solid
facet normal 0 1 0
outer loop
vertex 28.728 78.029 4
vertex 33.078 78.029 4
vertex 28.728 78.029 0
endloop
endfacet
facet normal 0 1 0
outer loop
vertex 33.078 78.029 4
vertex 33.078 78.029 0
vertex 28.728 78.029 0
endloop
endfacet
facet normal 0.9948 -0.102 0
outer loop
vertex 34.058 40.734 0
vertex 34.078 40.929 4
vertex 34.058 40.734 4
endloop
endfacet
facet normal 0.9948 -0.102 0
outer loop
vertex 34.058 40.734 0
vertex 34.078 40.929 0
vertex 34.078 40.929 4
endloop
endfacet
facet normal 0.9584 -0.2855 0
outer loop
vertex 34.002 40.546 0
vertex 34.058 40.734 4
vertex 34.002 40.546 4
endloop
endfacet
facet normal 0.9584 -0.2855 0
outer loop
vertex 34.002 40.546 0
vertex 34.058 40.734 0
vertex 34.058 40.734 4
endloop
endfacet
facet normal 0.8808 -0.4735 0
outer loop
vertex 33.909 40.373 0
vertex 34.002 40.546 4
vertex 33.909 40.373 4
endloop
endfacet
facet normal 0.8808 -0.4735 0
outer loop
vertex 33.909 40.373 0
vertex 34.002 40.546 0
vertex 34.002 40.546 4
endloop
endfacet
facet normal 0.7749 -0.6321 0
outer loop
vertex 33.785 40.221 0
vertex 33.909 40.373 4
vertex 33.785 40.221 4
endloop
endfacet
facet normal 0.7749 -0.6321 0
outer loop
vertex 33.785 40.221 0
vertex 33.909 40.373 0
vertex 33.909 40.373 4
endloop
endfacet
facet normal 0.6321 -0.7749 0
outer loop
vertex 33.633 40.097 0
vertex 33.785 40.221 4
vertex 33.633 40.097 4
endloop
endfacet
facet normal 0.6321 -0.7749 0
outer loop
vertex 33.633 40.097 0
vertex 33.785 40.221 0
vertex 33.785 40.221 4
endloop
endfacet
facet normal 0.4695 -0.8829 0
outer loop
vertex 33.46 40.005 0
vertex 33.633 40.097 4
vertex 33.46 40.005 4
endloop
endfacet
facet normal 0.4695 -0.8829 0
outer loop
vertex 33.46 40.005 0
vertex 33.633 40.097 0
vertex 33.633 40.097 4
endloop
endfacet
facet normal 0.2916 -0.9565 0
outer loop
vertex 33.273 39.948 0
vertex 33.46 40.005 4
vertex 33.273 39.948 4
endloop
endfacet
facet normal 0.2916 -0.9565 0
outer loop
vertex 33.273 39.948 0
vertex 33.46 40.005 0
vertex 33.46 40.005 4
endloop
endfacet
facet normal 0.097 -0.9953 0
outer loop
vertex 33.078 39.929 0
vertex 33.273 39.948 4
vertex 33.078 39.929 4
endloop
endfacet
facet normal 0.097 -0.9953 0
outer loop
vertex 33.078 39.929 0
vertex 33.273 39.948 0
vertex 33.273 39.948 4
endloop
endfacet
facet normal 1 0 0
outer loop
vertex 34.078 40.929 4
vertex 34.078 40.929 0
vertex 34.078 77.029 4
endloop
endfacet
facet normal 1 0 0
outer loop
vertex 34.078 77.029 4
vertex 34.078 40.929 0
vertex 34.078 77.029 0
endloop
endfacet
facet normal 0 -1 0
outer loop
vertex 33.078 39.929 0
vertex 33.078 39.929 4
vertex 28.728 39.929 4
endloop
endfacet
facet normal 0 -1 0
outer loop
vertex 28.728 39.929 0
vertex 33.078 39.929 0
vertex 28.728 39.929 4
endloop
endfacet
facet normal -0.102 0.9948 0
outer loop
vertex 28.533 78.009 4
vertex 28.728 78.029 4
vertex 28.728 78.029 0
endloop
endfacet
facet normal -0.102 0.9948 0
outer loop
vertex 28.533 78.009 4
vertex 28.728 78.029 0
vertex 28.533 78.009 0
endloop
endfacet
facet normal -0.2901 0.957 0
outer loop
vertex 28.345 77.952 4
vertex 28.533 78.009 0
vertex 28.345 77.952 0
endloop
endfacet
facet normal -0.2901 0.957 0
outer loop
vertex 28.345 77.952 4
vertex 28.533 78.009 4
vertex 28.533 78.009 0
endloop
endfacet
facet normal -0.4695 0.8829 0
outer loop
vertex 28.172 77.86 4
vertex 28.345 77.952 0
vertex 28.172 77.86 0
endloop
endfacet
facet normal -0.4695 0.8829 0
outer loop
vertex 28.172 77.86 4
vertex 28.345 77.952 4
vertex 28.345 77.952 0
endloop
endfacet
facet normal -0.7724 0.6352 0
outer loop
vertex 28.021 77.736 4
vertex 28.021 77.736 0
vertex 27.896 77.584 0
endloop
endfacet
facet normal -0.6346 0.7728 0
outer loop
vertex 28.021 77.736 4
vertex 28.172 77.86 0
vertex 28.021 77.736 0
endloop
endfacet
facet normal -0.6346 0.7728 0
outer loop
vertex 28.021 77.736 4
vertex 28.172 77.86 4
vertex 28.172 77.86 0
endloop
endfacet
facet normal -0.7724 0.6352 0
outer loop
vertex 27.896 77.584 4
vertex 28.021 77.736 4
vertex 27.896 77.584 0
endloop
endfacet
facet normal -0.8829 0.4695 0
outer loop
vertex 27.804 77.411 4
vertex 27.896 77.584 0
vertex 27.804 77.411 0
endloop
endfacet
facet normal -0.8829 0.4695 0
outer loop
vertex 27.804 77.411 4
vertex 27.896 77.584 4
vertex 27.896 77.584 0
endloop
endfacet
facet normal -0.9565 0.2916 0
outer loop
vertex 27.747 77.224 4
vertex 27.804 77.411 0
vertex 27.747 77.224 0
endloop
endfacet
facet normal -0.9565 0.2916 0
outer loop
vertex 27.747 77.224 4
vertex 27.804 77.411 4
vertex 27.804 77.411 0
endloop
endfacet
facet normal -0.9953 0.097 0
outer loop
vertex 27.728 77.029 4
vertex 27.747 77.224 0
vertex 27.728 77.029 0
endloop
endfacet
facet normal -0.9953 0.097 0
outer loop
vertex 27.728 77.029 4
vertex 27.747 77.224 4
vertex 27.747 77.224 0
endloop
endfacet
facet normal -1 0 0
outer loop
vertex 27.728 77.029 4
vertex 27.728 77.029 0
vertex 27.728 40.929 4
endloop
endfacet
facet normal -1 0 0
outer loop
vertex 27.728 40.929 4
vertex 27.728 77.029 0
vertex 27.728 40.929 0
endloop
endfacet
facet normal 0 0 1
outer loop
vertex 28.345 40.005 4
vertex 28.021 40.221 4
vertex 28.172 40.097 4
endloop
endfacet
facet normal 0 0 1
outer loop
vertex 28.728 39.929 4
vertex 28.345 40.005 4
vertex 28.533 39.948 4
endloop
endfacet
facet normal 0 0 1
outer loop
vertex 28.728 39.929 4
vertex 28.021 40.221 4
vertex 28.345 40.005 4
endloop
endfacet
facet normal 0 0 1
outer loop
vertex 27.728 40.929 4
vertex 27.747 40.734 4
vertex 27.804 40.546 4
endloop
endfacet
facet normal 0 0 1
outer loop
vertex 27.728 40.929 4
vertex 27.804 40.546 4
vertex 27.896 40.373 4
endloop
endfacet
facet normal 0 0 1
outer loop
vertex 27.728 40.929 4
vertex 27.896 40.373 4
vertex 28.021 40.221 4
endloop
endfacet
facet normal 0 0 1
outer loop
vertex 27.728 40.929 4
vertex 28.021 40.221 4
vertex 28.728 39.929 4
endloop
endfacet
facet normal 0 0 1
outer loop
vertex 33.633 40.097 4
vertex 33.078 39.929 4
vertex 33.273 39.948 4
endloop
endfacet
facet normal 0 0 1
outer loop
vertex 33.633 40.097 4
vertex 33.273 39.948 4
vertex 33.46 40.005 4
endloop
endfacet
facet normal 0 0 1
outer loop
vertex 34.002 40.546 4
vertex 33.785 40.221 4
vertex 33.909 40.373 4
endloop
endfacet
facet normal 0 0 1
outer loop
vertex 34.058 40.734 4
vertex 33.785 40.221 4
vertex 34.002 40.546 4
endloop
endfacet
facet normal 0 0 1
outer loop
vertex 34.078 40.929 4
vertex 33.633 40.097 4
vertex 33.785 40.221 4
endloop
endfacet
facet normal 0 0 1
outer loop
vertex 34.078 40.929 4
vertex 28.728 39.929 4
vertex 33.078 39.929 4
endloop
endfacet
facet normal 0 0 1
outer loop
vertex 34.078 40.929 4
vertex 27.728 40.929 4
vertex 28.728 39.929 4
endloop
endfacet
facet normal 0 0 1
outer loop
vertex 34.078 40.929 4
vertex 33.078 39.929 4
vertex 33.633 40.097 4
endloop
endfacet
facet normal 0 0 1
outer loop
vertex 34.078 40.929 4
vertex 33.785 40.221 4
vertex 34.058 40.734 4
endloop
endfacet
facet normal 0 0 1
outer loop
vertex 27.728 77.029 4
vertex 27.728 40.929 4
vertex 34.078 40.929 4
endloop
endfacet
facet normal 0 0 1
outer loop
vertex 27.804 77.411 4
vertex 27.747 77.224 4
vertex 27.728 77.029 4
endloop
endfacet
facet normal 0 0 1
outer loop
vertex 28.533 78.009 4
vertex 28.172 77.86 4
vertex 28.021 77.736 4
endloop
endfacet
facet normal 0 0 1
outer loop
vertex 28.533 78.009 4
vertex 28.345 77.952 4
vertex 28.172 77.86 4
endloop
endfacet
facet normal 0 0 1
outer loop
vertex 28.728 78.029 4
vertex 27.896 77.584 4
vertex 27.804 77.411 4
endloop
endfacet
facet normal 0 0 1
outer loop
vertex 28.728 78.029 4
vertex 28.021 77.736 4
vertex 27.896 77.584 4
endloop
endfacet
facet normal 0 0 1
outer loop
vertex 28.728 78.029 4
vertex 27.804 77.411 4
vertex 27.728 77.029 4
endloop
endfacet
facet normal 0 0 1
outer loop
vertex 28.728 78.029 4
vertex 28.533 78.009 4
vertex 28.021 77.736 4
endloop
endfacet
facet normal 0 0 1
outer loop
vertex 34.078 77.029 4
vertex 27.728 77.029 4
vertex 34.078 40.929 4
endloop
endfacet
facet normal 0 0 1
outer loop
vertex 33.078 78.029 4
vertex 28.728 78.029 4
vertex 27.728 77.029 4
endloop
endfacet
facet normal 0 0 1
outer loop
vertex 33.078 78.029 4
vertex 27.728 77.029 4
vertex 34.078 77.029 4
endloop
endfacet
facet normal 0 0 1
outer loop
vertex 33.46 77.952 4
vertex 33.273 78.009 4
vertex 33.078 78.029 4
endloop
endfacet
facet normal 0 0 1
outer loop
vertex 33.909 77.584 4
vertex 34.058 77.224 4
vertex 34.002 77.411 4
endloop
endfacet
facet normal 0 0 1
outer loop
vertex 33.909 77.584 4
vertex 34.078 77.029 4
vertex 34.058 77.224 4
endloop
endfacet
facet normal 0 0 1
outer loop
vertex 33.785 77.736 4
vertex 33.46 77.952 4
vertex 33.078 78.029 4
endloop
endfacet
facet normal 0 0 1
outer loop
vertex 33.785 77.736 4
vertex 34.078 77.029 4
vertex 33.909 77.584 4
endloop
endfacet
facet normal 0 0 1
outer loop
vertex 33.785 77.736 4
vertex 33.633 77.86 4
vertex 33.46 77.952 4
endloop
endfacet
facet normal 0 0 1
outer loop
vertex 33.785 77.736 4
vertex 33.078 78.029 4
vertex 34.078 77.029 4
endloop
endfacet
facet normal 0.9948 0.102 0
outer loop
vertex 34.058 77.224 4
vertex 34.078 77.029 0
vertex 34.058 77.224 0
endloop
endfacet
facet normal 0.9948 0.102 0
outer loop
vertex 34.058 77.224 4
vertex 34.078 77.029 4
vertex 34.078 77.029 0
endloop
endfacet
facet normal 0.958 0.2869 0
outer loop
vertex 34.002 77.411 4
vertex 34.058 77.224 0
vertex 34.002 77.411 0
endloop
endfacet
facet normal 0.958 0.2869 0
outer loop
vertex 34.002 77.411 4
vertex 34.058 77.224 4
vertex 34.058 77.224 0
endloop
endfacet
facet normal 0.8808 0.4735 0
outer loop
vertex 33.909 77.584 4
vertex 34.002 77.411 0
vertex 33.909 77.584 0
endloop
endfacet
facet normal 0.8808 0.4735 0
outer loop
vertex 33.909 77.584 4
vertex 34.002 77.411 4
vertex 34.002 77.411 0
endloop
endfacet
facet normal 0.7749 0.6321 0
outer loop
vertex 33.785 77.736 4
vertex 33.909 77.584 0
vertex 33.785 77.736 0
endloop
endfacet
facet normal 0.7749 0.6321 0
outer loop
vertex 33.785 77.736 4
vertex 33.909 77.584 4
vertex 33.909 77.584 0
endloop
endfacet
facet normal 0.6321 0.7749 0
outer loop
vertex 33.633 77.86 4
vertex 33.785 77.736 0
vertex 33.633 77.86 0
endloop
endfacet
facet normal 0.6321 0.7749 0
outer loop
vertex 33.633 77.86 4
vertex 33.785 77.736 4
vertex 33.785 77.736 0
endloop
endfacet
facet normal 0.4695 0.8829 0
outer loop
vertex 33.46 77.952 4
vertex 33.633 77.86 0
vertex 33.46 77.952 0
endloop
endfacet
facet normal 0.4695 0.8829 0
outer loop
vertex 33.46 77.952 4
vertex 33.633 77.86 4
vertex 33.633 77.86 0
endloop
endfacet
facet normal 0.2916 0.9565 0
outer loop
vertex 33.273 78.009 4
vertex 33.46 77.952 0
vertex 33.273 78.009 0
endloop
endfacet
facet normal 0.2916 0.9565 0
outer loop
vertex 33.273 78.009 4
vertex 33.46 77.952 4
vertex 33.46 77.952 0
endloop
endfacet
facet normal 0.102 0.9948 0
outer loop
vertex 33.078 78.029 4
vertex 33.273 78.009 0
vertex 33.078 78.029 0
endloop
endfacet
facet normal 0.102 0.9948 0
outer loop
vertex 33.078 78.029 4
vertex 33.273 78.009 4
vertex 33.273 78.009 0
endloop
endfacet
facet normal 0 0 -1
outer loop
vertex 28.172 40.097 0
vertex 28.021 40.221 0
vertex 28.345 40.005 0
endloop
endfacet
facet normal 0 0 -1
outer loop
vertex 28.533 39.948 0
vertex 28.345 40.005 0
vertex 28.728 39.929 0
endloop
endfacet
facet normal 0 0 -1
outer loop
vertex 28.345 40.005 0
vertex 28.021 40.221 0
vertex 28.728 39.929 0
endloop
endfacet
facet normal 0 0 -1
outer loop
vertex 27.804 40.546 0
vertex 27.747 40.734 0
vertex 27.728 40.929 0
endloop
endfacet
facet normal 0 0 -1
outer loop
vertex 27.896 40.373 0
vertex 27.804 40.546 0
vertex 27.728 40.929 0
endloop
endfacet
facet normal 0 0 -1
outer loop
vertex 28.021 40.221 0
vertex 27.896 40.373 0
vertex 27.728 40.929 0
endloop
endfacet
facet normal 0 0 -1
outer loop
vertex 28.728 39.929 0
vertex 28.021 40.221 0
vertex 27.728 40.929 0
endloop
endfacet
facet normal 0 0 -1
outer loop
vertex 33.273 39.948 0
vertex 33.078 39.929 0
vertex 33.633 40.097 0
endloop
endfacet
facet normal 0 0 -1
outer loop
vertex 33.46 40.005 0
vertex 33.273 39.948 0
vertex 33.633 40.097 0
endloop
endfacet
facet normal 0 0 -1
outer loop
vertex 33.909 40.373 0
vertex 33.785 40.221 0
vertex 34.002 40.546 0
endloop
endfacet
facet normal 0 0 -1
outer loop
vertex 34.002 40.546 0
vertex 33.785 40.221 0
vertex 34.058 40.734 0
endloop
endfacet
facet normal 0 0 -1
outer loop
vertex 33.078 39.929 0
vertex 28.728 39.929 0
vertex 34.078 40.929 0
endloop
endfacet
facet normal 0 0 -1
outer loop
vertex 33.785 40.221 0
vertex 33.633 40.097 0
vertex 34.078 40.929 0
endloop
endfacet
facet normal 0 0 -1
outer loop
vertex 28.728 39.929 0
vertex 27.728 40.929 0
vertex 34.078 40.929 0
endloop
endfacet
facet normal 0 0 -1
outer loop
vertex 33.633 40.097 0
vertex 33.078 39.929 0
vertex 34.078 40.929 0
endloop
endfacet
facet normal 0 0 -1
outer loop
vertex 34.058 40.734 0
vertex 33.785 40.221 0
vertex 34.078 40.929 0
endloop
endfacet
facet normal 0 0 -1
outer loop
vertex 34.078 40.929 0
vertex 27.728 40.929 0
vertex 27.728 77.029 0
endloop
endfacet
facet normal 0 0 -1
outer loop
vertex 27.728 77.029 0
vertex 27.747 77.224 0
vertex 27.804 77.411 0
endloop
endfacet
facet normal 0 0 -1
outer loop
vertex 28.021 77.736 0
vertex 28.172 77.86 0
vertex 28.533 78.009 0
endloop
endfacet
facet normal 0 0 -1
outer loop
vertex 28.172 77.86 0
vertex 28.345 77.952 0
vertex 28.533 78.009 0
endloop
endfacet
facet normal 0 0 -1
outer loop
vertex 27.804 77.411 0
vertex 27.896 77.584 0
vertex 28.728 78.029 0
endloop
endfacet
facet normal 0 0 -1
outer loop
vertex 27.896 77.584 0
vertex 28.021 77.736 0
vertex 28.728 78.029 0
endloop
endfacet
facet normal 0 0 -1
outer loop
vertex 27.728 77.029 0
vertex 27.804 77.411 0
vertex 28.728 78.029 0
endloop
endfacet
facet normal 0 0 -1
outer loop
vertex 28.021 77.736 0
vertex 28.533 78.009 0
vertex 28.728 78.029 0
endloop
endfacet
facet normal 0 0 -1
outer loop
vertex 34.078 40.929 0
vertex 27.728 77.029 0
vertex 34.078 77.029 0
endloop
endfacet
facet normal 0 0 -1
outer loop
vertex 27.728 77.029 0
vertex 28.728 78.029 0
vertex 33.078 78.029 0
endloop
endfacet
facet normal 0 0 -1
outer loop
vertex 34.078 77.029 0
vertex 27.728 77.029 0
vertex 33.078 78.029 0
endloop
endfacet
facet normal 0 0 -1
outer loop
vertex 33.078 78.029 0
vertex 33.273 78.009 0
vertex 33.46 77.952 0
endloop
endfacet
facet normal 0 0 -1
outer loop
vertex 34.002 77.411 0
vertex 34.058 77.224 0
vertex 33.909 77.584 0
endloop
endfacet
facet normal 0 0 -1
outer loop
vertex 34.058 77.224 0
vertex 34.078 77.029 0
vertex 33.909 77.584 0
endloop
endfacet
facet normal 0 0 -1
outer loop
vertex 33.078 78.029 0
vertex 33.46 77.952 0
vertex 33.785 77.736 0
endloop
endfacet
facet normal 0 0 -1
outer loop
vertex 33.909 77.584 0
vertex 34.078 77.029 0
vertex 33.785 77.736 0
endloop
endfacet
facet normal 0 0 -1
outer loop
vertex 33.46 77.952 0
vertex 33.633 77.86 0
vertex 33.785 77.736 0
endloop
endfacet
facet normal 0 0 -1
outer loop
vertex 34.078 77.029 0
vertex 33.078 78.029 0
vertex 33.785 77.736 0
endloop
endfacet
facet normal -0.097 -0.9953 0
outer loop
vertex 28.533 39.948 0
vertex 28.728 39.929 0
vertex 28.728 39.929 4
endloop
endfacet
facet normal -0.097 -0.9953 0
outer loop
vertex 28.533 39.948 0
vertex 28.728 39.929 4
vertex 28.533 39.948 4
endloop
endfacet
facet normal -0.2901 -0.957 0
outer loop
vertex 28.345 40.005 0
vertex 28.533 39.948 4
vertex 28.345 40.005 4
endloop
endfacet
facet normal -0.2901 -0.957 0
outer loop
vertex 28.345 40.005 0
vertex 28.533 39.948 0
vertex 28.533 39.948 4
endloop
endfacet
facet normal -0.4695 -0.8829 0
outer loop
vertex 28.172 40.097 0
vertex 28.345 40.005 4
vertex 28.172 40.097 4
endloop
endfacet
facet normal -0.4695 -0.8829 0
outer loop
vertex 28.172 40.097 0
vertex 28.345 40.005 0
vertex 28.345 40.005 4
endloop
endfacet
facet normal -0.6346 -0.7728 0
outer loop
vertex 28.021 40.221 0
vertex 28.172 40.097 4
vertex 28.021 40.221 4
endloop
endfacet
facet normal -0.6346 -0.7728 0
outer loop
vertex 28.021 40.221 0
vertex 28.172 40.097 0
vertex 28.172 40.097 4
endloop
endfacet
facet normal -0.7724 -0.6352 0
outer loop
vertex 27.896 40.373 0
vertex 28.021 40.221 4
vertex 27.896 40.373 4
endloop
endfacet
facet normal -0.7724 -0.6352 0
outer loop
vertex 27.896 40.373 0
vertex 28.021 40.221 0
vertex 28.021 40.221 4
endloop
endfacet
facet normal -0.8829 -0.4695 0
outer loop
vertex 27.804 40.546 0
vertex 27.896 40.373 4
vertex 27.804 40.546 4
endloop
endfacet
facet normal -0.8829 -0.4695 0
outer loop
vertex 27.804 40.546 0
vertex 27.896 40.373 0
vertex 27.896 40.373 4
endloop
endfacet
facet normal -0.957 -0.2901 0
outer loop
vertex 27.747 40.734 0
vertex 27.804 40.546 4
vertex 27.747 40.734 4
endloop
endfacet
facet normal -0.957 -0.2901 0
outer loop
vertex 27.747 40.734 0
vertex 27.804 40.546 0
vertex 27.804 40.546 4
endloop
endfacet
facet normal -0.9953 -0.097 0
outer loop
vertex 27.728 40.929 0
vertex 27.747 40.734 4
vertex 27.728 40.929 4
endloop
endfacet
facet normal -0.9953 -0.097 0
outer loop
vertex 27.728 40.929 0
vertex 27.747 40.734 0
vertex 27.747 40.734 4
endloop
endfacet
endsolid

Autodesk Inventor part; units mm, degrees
ref_plane "YZ Plane" through (0, 0, 0) normal (1, 0, 0) x (0, 1, 0)
ref_plane "XZ Plane" through (0, 0, 0) normal (0, 1, 0) x (-1, 0, 0)
ref_plane "XY Plane" through (0, 0, 0) normal (0, 0, 1) x (1, 0, 0)
sketch "Sketch1" plane through (0, 0, 0) normal (0, 0, 1) x (1, 0, 0)
  circle A0 centre (27.1, 34.2286) radius 4 projected
  circle A1 centre (27.1, 34.2286) radius 5 projected
  circle A2 centre (27.0777, 74.6286) radius 4 projected
  circle A3 centre (27.0777, 74.6286) radius 5 projected
  line L0 (32.0777, 76.0286) -> (34.0777, 76.0286)
  line L1 (34.0777, 76.0286) -> (34.0777, 78.0286)
  line L2 (29.7277, 29.2286) -> (27.7277, 29.2286)
  line L3 (27.7277, 29.2286) -> (27.7277, 27.2286)
  line L4 (27.7277, 27.2286) -> (34.0777, 27.2286)
  line L5 (34.0777, 27.2286) -> (34.0777, 78.0286)
  line L6 (34.0777, 78.0286) -> (27.7277, 78.0286)
  line L7 (27.7277, 78.0286) -> (27.7277, 27.2286)
  line L8 (20.0777, 74.6286) -> (27.7277, 412444959.5971)
  point P0 (0, 0)
  dimension "d0" = 2
  dimension "d1" = 2
  dimension "d2" = 2
  dimension "d3" = 2
  dimension "d8" = 50.8
  dimension "d14" = 6.35
extrude "Extrusion2" add sketch "Sketch1" along normal blind 4 contours A0 L7 | A0 L7 A1 | L7 A3 L6 L1 L5 L4 L3 A1 | L7 A2 L6 A3 | L7 L6 A2 picked at (29.1356, 35.0943) picked at (31.6818, 33.5199) picked at (31.6654, 75.3088) picked at (28.0276, 73.2171)
sketch "Sketch2" plane through (0, 0, 4) normal (0, 0, 1) x (1, 0, 0)
  line L0 (34.0777, 27.2286) -> (34.0777, 78.0286) projected
  line L1 (34.0777, 27.2286) -> (34.0777, 39.9286)
  line L2 (27.7277, 78.0286) -> (27.7277, 27.2286) projected
  line L3 (34.0777, 39.9286) -> (27.7277, 39.9286)
  line L4 (27.7277, 39.9286) -> (27.7277, 27.2286)
  line L5 (27.7277, 27.2286) -> (34.0777, 27.2286)
  line L6 (34.0777, 27.2286) -> (34.0777, 39.9286)
  point P0 (0, 0)
  dimension "d15" = 12.7
extrude "Extrusion3" cut sketch "Sketch2" against normal blind 25.4
fillet "Fillet2" radius 1 4 edges at (27.7277, 39.9286, 2) (34.0777, 39.9286, 2) (34.0777, 78.0286, 2) (27.7277, 78.0286, 2)
properties part number "ConnectorRodBodies"
